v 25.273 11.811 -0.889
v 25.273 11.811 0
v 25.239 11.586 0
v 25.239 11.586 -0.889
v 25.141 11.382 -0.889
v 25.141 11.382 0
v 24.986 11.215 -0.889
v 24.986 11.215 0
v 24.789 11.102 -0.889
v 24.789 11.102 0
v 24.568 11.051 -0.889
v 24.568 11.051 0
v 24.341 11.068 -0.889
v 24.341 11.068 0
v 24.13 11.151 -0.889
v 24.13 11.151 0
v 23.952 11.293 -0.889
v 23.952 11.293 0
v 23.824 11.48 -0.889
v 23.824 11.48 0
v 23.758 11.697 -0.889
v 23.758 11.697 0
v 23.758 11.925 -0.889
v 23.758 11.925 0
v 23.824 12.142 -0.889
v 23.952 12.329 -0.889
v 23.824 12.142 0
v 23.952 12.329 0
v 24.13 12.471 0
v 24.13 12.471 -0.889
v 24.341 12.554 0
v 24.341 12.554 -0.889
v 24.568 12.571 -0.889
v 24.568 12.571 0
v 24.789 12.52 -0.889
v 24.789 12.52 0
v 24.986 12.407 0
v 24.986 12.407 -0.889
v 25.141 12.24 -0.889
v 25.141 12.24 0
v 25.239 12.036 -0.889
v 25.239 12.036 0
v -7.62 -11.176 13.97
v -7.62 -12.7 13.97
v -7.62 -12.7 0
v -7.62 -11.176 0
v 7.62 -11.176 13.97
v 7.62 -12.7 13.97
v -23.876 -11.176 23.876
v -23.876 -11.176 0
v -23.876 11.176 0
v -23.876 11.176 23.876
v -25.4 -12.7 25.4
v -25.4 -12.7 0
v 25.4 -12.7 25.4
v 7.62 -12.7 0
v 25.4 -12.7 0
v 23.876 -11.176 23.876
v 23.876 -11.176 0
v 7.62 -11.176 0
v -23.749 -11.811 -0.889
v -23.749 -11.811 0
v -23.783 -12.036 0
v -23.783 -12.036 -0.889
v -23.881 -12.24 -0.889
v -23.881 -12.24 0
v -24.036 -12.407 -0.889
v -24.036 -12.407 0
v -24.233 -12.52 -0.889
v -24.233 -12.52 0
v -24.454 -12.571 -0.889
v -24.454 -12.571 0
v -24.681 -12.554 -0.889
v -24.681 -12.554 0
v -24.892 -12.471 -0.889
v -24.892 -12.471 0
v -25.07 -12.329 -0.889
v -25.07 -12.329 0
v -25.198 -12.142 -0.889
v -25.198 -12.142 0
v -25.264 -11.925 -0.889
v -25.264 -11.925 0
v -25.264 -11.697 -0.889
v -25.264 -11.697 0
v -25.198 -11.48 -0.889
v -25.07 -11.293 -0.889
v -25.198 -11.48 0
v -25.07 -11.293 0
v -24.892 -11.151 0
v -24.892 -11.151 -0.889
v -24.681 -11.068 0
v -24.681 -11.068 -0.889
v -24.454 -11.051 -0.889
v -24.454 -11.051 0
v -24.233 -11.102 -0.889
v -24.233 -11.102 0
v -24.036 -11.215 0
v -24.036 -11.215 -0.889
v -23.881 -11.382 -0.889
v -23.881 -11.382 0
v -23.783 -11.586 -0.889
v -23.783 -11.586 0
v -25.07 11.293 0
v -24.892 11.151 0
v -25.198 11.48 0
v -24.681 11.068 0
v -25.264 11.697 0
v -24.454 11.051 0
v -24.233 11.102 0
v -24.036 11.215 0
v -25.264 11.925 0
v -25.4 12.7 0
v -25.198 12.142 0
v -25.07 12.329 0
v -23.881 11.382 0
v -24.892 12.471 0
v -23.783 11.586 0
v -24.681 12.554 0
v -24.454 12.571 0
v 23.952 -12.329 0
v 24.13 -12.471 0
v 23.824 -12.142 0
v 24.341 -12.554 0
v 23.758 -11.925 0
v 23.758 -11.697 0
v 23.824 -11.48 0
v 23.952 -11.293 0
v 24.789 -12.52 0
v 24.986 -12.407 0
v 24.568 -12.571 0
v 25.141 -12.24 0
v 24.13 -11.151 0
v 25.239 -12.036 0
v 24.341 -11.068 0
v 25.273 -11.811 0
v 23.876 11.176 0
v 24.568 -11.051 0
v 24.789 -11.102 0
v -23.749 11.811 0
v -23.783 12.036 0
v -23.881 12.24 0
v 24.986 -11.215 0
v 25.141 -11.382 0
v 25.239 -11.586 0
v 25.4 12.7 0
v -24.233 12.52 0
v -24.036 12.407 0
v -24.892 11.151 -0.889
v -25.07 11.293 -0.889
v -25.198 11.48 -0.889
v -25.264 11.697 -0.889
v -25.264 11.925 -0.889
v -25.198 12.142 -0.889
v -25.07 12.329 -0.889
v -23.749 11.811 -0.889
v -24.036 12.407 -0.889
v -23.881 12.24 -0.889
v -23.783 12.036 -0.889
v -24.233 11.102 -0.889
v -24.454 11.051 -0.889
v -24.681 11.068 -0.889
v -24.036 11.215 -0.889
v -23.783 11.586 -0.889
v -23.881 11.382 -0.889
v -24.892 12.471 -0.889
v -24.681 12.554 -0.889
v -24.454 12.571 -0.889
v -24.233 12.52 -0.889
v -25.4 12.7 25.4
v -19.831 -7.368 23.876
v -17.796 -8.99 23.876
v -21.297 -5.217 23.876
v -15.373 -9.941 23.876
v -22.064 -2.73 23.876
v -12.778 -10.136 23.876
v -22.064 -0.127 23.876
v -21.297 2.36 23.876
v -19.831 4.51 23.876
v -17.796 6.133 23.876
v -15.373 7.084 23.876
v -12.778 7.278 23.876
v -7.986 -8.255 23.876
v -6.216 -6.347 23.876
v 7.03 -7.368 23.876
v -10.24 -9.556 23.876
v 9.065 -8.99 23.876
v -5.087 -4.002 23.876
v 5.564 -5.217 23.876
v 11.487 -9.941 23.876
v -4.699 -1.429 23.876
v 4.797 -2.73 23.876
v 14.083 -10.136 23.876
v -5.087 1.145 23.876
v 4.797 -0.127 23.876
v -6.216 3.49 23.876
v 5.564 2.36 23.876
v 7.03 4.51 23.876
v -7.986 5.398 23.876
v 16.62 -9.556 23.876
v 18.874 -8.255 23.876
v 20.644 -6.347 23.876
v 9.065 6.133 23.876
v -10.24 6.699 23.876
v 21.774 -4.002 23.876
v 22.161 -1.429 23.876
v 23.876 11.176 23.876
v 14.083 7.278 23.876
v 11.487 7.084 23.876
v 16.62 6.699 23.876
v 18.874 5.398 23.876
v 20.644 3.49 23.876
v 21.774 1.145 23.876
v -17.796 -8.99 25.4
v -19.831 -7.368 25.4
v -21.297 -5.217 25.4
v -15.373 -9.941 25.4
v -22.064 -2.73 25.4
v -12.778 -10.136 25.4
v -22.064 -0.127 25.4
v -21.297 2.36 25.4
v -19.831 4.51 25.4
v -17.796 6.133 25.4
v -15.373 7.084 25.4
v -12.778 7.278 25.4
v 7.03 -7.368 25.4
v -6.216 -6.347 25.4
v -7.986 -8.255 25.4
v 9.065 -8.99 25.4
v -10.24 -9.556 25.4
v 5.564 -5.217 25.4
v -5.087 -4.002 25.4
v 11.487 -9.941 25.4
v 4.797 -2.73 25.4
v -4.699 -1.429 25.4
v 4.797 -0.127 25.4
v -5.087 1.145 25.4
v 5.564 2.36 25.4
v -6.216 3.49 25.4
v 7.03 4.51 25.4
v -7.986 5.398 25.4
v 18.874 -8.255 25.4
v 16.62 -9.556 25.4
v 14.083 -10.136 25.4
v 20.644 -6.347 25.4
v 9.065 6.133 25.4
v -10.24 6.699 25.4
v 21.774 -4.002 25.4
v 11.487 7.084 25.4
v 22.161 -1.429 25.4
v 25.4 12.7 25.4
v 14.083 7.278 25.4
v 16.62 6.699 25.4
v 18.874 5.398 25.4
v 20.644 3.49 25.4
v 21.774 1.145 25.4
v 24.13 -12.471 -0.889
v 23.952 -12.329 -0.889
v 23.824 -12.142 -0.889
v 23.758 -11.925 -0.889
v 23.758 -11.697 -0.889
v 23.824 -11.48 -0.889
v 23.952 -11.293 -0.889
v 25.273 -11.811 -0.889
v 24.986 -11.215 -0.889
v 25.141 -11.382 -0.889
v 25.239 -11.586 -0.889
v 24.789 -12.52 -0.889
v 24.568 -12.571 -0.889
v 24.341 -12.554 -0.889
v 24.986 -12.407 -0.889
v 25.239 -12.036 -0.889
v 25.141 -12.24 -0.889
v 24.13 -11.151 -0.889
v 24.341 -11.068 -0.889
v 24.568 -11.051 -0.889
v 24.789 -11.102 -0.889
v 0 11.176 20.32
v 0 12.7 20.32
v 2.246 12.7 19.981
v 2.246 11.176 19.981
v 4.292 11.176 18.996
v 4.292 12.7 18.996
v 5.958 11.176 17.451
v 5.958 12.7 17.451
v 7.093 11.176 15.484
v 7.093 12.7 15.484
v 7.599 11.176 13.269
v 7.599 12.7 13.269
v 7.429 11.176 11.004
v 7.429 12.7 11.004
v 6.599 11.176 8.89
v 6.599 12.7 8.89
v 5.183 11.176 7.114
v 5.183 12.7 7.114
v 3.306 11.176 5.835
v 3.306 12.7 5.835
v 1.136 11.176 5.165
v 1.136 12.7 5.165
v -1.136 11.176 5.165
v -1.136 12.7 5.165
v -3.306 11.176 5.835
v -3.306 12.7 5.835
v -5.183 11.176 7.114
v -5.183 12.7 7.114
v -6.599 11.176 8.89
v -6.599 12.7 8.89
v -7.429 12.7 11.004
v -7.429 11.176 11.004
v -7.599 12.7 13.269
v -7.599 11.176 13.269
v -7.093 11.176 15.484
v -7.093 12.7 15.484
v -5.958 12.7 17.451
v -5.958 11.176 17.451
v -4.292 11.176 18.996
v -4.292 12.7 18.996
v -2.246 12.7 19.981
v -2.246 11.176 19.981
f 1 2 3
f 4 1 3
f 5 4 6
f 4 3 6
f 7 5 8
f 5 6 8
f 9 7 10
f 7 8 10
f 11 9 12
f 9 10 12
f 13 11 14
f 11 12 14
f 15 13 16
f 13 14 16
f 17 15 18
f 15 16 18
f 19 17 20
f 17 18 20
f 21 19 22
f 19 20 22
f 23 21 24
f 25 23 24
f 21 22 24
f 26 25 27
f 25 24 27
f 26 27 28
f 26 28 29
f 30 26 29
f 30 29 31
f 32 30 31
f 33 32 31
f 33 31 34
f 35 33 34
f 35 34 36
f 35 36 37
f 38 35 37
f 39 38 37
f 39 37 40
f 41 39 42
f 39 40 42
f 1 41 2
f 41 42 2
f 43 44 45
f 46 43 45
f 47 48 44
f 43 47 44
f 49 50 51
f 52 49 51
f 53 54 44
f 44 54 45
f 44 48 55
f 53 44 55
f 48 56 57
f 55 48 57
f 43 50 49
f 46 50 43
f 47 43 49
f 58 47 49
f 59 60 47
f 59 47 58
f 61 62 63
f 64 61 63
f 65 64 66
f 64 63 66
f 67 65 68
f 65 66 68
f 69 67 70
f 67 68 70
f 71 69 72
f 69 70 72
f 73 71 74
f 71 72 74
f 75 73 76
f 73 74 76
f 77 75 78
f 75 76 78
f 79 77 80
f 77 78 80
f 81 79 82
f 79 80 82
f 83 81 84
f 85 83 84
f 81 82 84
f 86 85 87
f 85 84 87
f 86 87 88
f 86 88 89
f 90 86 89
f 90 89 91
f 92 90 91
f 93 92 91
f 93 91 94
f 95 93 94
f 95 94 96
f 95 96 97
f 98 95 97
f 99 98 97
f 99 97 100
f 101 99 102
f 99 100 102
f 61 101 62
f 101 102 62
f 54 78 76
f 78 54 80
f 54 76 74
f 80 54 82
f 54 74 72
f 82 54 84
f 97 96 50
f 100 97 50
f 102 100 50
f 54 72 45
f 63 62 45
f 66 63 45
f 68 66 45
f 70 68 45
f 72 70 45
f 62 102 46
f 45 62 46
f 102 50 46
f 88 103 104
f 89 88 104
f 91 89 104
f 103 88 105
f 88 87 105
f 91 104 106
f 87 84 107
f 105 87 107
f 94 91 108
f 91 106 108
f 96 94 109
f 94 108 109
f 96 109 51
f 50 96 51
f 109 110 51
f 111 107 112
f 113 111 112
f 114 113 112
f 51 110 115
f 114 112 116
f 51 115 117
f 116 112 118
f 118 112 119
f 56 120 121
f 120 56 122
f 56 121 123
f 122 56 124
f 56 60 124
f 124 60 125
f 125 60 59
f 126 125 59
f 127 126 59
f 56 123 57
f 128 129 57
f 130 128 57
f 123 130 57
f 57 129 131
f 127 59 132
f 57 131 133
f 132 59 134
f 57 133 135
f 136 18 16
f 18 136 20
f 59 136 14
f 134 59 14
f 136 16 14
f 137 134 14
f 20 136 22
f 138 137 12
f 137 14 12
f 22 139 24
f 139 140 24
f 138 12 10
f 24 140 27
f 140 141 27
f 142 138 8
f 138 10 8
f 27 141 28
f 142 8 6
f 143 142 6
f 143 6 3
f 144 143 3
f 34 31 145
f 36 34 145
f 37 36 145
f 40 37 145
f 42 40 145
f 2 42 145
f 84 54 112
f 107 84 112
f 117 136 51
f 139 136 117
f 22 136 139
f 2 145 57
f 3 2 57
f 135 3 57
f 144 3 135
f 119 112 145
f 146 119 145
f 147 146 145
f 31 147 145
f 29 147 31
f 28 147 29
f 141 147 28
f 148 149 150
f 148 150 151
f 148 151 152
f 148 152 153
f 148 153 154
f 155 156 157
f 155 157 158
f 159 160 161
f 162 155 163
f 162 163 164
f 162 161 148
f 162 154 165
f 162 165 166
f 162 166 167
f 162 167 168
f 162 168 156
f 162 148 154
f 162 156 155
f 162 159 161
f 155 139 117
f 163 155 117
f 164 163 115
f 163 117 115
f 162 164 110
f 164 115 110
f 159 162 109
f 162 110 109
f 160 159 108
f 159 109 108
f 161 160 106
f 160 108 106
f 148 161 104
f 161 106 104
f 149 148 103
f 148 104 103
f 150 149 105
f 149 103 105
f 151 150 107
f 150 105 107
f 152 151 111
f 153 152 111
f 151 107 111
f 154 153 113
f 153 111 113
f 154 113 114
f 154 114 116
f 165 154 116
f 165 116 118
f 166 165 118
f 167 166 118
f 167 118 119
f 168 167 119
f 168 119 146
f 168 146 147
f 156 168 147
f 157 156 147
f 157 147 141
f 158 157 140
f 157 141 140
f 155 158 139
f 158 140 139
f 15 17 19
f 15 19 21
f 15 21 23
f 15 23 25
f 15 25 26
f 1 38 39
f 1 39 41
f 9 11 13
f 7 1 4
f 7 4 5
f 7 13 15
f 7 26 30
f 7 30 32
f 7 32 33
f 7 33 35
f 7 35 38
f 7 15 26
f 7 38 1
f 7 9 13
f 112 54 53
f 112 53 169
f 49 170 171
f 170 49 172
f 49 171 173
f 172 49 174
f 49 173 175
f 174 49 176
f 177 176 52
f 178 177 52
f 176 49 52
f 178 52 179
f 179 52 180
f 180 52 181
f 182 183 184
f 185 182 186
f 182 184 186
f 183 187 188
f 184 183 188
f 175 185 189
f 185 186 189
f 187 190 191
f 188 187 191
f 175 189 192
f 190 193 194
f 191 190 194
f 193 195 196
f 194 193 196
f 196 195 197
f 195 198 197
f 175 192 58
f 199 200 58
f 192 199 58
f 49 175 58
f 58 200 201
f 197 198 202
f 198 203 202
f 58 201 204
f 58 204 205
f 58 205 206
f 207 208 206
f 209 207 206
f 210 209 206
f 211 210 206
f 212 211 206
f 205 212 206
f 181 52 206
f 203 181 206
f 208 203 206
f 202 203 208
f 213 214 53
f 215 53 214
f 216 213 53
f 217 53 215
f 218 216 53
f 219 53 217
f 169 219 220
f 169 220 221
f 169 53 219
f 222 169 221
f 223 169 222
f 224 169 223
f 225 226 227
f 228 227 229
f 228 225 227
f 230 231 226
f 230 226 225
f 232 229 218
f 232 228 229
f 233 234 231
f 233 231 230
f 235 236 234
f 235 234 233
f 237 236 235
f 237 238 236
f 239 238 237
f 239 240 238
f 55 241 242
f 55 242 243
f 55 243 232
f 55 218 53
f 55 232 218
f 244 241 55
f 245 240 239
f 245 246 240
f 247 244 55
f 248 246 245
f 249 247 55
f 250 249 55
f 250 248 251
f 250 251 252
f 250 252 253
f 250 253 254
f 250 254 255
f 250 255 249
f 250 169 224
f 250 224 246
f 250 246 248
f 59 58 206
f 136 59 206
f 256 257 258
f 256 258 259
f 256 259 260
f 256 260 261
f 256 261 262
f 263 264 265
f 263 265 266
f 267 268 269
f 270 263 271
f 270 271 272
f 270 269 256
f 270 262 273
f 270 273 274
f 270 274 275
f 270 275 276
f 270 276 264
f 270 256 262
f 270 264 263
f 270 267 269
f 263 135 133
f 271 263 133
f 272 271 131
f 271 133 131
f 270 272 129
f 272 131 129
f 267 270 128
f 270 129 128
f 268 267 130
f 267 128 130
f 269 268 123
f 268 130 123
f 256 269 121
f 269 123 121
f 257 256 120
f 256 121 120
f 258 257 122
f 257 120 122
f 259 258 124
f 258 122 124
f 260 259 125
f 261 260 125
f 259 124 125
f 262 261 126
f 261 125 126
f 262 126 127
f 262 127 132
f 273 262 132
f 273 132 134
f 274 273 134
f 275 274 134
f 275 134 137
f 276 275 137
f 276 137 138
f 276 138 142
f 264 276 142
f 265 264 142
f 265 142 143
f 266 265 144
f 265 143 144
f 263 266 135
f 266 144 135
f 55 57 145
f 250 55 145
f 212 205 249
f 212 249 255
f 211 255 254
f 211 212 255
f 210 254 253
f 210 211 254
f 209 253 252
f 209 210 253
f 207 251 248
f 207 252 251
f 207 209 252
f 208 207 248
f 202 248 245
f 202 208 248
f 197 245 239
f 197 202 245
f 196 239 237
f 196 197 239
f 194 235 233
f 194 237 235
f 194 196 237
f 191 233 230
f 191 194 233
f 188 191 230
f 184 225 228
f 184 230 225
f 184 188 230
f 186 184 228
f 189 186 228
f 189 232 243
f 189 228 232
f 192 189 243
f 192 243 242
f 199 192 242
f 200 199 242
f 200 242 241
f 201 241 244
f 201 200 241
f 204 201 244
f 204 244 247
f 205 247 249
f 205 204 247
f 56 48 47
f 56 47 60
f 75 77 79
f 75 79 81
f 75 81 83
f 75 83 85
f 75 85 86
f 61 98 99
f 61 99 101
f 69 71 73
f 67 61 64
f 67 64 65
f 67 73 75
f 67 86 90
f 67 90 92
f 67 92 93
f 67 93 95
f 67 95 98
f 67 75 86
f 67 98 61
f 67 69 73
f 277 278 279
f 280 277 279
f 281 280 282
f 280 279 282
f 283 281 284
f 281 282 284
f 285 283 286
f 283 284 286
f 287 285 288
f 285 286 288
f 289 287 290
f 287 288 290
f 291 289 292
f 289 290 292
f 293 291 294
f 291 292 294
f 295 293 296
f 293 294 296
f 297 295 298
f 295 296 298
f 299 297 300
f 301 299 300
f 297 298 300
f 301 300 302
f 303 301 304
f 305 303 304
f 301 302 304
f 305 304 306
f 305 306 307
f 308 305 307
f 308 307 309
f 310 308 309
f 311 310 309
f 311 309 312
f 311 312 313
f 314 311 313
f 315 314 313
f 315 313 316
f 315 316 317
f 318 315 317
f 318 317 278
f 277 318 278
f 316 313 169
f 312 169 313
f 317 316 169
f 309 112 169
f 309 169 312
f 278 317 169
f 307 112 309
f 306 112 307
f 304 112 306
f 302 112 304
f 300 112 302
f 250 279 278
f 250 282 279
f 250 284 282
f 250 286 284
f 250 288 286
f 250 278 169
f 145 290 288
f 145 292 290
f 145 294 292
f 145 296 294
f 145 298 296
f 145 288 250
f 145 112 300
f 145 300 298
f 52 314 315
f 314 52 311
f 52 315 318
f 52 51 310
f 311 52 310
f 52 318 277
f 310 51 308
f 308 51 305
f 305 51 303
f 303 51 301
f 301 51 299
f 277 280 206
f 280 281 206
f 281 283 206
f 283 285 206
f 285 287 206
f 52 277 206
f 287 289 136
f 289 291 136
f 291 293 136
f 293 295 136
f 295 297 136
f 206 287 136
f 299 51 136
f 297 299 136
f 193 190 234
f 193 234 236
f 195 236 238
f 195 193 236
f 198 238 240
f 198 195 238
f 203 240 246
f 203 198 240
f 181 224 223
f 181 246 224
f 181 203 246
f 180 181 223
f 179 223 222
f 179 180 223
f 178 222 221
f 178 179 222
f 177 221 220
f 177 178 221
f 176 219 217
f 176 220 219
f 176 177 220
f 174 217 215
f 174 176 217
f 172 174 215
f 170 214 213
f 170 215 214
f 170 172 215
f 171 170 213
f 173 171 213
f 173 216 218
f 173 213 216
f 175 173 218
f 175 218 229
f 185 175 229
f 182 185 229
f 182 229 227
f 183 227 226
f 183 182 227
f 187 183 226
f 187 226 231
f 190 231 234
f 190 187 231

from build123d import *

# Parameters (mm, degrees)
SKETCH1_W               = 50.8
SKETCH1_H               = 25.4
BOSS_EXTRUDE1_DEPTH     = 25.4
SHELL1_T                = -1.524
SKETCH2_R               = 0.762
BOSS_EXTRUDE2_DEPTH     = 0.889
SKETCH3_W               = 15.24
SKETCH3_H               = 13.97
CUT_EXTRUDE1_DEPTH      = 23.876
SKETCH4_R               = 7.62
CUT_EXTRUDE2_DEPTH      = 23.876
CUT_EXTRUDE3_DEPTH      = 39.698340029
CUT_EXTRUDE3_DEPTH_BACK = 39.698340029
SKETCH5_R               = 8.73125


with BuildPart() as part:
    # Sketch1 → Boss-Extrude1 (new body)
    with BuildSketch(Plane.XY):
        Rectangle(SKETCH1_W, SKETCH1_H)
    extrude(amount=BOSS_EXTRUDE1_DEPTH)

    # Shell1
    shell1_openings = [part.faces().sort_by_distance(p)[0] for p in [
        (0, 0, 0),
    ]]
    offset(amount=SHELL1_T, openings=shell1_openings, kind=Kind.INTERSECTION)

    # Sketch2 → Boss-Extrude2 (add)
    with BuildSketch(Plane(origin=(0, 0, 0), x_dir=(-1, 0, 0), z_dir=(0, 0, -1))):
        with Locations(Location((-24.511, 11.811, 0), (0, 0, 180))):
            Circle(SKETCH2_R)
        with Locations(Location((24.511, 11.811, 0), (0, 0, 180))):
            Circle(SKETCH2_R)
        with Locations(Location((24.511, -11.811, 0), (0, 0, 180))):
            Circle(SKETCH2_R)
        with Locations(Location((-24.511, -11.811, 0), (0, 0, 180))):
            Circle(SKETCH2_R)
    extrude(amount=BOSS_EXTRUDE2_DEPTH)

    # Sketch3 → Cut-Extrude1 (cut)
    with BuildSketch(Plane(origin=(0, -12.7, 0), x_dir=(-1, 0, 0), z_dir=(0, -1, 0))):
        with Locations((0, -6.985)):
            Rectangle(SKETCH3_W, SKETCH3_H)
    extrude(amount=-CUT_EXTRUDE1_DEPTH, mode=Mode.SUBTRACT)

    # Sketch4 → Cut-Extrude2 (cut)
    with BuildSketch(Plane(origin=(0, 12.7, 0), x_dir=(1, 0, 0), z_dir=(0, 1, 0))):
        with Locations(Location((0, -12.7, 0), (0, 0, 270))):
            Circle(SKETCH4_R)
    extrude(amount=-CUT_EXTRUDE2_DEPTH, mode=Mode.SUBTRACT)

    # Sketch5 → Cut-Extrude3 (cut, two sides: drawn at the far end of the back side and taken through both)
    with BuildSketch(Plane.XY.offset(25.4).offset(-CUT_EXTRUDE3_DEPTH_BACK)):
        with Locations((-13.43025, -1.42875)):
            Circle(SKETCH5_R)
        with Locations((13.43025, -1.42875)):
            Circle(SKETCH5_R)
    extrude(amount=CUT_EXTRUDE3_DEPTH + CUT_EXTRUDE3_DEPTH_BACK, mode=Mode.SUBTRACT)


solid = part.part
